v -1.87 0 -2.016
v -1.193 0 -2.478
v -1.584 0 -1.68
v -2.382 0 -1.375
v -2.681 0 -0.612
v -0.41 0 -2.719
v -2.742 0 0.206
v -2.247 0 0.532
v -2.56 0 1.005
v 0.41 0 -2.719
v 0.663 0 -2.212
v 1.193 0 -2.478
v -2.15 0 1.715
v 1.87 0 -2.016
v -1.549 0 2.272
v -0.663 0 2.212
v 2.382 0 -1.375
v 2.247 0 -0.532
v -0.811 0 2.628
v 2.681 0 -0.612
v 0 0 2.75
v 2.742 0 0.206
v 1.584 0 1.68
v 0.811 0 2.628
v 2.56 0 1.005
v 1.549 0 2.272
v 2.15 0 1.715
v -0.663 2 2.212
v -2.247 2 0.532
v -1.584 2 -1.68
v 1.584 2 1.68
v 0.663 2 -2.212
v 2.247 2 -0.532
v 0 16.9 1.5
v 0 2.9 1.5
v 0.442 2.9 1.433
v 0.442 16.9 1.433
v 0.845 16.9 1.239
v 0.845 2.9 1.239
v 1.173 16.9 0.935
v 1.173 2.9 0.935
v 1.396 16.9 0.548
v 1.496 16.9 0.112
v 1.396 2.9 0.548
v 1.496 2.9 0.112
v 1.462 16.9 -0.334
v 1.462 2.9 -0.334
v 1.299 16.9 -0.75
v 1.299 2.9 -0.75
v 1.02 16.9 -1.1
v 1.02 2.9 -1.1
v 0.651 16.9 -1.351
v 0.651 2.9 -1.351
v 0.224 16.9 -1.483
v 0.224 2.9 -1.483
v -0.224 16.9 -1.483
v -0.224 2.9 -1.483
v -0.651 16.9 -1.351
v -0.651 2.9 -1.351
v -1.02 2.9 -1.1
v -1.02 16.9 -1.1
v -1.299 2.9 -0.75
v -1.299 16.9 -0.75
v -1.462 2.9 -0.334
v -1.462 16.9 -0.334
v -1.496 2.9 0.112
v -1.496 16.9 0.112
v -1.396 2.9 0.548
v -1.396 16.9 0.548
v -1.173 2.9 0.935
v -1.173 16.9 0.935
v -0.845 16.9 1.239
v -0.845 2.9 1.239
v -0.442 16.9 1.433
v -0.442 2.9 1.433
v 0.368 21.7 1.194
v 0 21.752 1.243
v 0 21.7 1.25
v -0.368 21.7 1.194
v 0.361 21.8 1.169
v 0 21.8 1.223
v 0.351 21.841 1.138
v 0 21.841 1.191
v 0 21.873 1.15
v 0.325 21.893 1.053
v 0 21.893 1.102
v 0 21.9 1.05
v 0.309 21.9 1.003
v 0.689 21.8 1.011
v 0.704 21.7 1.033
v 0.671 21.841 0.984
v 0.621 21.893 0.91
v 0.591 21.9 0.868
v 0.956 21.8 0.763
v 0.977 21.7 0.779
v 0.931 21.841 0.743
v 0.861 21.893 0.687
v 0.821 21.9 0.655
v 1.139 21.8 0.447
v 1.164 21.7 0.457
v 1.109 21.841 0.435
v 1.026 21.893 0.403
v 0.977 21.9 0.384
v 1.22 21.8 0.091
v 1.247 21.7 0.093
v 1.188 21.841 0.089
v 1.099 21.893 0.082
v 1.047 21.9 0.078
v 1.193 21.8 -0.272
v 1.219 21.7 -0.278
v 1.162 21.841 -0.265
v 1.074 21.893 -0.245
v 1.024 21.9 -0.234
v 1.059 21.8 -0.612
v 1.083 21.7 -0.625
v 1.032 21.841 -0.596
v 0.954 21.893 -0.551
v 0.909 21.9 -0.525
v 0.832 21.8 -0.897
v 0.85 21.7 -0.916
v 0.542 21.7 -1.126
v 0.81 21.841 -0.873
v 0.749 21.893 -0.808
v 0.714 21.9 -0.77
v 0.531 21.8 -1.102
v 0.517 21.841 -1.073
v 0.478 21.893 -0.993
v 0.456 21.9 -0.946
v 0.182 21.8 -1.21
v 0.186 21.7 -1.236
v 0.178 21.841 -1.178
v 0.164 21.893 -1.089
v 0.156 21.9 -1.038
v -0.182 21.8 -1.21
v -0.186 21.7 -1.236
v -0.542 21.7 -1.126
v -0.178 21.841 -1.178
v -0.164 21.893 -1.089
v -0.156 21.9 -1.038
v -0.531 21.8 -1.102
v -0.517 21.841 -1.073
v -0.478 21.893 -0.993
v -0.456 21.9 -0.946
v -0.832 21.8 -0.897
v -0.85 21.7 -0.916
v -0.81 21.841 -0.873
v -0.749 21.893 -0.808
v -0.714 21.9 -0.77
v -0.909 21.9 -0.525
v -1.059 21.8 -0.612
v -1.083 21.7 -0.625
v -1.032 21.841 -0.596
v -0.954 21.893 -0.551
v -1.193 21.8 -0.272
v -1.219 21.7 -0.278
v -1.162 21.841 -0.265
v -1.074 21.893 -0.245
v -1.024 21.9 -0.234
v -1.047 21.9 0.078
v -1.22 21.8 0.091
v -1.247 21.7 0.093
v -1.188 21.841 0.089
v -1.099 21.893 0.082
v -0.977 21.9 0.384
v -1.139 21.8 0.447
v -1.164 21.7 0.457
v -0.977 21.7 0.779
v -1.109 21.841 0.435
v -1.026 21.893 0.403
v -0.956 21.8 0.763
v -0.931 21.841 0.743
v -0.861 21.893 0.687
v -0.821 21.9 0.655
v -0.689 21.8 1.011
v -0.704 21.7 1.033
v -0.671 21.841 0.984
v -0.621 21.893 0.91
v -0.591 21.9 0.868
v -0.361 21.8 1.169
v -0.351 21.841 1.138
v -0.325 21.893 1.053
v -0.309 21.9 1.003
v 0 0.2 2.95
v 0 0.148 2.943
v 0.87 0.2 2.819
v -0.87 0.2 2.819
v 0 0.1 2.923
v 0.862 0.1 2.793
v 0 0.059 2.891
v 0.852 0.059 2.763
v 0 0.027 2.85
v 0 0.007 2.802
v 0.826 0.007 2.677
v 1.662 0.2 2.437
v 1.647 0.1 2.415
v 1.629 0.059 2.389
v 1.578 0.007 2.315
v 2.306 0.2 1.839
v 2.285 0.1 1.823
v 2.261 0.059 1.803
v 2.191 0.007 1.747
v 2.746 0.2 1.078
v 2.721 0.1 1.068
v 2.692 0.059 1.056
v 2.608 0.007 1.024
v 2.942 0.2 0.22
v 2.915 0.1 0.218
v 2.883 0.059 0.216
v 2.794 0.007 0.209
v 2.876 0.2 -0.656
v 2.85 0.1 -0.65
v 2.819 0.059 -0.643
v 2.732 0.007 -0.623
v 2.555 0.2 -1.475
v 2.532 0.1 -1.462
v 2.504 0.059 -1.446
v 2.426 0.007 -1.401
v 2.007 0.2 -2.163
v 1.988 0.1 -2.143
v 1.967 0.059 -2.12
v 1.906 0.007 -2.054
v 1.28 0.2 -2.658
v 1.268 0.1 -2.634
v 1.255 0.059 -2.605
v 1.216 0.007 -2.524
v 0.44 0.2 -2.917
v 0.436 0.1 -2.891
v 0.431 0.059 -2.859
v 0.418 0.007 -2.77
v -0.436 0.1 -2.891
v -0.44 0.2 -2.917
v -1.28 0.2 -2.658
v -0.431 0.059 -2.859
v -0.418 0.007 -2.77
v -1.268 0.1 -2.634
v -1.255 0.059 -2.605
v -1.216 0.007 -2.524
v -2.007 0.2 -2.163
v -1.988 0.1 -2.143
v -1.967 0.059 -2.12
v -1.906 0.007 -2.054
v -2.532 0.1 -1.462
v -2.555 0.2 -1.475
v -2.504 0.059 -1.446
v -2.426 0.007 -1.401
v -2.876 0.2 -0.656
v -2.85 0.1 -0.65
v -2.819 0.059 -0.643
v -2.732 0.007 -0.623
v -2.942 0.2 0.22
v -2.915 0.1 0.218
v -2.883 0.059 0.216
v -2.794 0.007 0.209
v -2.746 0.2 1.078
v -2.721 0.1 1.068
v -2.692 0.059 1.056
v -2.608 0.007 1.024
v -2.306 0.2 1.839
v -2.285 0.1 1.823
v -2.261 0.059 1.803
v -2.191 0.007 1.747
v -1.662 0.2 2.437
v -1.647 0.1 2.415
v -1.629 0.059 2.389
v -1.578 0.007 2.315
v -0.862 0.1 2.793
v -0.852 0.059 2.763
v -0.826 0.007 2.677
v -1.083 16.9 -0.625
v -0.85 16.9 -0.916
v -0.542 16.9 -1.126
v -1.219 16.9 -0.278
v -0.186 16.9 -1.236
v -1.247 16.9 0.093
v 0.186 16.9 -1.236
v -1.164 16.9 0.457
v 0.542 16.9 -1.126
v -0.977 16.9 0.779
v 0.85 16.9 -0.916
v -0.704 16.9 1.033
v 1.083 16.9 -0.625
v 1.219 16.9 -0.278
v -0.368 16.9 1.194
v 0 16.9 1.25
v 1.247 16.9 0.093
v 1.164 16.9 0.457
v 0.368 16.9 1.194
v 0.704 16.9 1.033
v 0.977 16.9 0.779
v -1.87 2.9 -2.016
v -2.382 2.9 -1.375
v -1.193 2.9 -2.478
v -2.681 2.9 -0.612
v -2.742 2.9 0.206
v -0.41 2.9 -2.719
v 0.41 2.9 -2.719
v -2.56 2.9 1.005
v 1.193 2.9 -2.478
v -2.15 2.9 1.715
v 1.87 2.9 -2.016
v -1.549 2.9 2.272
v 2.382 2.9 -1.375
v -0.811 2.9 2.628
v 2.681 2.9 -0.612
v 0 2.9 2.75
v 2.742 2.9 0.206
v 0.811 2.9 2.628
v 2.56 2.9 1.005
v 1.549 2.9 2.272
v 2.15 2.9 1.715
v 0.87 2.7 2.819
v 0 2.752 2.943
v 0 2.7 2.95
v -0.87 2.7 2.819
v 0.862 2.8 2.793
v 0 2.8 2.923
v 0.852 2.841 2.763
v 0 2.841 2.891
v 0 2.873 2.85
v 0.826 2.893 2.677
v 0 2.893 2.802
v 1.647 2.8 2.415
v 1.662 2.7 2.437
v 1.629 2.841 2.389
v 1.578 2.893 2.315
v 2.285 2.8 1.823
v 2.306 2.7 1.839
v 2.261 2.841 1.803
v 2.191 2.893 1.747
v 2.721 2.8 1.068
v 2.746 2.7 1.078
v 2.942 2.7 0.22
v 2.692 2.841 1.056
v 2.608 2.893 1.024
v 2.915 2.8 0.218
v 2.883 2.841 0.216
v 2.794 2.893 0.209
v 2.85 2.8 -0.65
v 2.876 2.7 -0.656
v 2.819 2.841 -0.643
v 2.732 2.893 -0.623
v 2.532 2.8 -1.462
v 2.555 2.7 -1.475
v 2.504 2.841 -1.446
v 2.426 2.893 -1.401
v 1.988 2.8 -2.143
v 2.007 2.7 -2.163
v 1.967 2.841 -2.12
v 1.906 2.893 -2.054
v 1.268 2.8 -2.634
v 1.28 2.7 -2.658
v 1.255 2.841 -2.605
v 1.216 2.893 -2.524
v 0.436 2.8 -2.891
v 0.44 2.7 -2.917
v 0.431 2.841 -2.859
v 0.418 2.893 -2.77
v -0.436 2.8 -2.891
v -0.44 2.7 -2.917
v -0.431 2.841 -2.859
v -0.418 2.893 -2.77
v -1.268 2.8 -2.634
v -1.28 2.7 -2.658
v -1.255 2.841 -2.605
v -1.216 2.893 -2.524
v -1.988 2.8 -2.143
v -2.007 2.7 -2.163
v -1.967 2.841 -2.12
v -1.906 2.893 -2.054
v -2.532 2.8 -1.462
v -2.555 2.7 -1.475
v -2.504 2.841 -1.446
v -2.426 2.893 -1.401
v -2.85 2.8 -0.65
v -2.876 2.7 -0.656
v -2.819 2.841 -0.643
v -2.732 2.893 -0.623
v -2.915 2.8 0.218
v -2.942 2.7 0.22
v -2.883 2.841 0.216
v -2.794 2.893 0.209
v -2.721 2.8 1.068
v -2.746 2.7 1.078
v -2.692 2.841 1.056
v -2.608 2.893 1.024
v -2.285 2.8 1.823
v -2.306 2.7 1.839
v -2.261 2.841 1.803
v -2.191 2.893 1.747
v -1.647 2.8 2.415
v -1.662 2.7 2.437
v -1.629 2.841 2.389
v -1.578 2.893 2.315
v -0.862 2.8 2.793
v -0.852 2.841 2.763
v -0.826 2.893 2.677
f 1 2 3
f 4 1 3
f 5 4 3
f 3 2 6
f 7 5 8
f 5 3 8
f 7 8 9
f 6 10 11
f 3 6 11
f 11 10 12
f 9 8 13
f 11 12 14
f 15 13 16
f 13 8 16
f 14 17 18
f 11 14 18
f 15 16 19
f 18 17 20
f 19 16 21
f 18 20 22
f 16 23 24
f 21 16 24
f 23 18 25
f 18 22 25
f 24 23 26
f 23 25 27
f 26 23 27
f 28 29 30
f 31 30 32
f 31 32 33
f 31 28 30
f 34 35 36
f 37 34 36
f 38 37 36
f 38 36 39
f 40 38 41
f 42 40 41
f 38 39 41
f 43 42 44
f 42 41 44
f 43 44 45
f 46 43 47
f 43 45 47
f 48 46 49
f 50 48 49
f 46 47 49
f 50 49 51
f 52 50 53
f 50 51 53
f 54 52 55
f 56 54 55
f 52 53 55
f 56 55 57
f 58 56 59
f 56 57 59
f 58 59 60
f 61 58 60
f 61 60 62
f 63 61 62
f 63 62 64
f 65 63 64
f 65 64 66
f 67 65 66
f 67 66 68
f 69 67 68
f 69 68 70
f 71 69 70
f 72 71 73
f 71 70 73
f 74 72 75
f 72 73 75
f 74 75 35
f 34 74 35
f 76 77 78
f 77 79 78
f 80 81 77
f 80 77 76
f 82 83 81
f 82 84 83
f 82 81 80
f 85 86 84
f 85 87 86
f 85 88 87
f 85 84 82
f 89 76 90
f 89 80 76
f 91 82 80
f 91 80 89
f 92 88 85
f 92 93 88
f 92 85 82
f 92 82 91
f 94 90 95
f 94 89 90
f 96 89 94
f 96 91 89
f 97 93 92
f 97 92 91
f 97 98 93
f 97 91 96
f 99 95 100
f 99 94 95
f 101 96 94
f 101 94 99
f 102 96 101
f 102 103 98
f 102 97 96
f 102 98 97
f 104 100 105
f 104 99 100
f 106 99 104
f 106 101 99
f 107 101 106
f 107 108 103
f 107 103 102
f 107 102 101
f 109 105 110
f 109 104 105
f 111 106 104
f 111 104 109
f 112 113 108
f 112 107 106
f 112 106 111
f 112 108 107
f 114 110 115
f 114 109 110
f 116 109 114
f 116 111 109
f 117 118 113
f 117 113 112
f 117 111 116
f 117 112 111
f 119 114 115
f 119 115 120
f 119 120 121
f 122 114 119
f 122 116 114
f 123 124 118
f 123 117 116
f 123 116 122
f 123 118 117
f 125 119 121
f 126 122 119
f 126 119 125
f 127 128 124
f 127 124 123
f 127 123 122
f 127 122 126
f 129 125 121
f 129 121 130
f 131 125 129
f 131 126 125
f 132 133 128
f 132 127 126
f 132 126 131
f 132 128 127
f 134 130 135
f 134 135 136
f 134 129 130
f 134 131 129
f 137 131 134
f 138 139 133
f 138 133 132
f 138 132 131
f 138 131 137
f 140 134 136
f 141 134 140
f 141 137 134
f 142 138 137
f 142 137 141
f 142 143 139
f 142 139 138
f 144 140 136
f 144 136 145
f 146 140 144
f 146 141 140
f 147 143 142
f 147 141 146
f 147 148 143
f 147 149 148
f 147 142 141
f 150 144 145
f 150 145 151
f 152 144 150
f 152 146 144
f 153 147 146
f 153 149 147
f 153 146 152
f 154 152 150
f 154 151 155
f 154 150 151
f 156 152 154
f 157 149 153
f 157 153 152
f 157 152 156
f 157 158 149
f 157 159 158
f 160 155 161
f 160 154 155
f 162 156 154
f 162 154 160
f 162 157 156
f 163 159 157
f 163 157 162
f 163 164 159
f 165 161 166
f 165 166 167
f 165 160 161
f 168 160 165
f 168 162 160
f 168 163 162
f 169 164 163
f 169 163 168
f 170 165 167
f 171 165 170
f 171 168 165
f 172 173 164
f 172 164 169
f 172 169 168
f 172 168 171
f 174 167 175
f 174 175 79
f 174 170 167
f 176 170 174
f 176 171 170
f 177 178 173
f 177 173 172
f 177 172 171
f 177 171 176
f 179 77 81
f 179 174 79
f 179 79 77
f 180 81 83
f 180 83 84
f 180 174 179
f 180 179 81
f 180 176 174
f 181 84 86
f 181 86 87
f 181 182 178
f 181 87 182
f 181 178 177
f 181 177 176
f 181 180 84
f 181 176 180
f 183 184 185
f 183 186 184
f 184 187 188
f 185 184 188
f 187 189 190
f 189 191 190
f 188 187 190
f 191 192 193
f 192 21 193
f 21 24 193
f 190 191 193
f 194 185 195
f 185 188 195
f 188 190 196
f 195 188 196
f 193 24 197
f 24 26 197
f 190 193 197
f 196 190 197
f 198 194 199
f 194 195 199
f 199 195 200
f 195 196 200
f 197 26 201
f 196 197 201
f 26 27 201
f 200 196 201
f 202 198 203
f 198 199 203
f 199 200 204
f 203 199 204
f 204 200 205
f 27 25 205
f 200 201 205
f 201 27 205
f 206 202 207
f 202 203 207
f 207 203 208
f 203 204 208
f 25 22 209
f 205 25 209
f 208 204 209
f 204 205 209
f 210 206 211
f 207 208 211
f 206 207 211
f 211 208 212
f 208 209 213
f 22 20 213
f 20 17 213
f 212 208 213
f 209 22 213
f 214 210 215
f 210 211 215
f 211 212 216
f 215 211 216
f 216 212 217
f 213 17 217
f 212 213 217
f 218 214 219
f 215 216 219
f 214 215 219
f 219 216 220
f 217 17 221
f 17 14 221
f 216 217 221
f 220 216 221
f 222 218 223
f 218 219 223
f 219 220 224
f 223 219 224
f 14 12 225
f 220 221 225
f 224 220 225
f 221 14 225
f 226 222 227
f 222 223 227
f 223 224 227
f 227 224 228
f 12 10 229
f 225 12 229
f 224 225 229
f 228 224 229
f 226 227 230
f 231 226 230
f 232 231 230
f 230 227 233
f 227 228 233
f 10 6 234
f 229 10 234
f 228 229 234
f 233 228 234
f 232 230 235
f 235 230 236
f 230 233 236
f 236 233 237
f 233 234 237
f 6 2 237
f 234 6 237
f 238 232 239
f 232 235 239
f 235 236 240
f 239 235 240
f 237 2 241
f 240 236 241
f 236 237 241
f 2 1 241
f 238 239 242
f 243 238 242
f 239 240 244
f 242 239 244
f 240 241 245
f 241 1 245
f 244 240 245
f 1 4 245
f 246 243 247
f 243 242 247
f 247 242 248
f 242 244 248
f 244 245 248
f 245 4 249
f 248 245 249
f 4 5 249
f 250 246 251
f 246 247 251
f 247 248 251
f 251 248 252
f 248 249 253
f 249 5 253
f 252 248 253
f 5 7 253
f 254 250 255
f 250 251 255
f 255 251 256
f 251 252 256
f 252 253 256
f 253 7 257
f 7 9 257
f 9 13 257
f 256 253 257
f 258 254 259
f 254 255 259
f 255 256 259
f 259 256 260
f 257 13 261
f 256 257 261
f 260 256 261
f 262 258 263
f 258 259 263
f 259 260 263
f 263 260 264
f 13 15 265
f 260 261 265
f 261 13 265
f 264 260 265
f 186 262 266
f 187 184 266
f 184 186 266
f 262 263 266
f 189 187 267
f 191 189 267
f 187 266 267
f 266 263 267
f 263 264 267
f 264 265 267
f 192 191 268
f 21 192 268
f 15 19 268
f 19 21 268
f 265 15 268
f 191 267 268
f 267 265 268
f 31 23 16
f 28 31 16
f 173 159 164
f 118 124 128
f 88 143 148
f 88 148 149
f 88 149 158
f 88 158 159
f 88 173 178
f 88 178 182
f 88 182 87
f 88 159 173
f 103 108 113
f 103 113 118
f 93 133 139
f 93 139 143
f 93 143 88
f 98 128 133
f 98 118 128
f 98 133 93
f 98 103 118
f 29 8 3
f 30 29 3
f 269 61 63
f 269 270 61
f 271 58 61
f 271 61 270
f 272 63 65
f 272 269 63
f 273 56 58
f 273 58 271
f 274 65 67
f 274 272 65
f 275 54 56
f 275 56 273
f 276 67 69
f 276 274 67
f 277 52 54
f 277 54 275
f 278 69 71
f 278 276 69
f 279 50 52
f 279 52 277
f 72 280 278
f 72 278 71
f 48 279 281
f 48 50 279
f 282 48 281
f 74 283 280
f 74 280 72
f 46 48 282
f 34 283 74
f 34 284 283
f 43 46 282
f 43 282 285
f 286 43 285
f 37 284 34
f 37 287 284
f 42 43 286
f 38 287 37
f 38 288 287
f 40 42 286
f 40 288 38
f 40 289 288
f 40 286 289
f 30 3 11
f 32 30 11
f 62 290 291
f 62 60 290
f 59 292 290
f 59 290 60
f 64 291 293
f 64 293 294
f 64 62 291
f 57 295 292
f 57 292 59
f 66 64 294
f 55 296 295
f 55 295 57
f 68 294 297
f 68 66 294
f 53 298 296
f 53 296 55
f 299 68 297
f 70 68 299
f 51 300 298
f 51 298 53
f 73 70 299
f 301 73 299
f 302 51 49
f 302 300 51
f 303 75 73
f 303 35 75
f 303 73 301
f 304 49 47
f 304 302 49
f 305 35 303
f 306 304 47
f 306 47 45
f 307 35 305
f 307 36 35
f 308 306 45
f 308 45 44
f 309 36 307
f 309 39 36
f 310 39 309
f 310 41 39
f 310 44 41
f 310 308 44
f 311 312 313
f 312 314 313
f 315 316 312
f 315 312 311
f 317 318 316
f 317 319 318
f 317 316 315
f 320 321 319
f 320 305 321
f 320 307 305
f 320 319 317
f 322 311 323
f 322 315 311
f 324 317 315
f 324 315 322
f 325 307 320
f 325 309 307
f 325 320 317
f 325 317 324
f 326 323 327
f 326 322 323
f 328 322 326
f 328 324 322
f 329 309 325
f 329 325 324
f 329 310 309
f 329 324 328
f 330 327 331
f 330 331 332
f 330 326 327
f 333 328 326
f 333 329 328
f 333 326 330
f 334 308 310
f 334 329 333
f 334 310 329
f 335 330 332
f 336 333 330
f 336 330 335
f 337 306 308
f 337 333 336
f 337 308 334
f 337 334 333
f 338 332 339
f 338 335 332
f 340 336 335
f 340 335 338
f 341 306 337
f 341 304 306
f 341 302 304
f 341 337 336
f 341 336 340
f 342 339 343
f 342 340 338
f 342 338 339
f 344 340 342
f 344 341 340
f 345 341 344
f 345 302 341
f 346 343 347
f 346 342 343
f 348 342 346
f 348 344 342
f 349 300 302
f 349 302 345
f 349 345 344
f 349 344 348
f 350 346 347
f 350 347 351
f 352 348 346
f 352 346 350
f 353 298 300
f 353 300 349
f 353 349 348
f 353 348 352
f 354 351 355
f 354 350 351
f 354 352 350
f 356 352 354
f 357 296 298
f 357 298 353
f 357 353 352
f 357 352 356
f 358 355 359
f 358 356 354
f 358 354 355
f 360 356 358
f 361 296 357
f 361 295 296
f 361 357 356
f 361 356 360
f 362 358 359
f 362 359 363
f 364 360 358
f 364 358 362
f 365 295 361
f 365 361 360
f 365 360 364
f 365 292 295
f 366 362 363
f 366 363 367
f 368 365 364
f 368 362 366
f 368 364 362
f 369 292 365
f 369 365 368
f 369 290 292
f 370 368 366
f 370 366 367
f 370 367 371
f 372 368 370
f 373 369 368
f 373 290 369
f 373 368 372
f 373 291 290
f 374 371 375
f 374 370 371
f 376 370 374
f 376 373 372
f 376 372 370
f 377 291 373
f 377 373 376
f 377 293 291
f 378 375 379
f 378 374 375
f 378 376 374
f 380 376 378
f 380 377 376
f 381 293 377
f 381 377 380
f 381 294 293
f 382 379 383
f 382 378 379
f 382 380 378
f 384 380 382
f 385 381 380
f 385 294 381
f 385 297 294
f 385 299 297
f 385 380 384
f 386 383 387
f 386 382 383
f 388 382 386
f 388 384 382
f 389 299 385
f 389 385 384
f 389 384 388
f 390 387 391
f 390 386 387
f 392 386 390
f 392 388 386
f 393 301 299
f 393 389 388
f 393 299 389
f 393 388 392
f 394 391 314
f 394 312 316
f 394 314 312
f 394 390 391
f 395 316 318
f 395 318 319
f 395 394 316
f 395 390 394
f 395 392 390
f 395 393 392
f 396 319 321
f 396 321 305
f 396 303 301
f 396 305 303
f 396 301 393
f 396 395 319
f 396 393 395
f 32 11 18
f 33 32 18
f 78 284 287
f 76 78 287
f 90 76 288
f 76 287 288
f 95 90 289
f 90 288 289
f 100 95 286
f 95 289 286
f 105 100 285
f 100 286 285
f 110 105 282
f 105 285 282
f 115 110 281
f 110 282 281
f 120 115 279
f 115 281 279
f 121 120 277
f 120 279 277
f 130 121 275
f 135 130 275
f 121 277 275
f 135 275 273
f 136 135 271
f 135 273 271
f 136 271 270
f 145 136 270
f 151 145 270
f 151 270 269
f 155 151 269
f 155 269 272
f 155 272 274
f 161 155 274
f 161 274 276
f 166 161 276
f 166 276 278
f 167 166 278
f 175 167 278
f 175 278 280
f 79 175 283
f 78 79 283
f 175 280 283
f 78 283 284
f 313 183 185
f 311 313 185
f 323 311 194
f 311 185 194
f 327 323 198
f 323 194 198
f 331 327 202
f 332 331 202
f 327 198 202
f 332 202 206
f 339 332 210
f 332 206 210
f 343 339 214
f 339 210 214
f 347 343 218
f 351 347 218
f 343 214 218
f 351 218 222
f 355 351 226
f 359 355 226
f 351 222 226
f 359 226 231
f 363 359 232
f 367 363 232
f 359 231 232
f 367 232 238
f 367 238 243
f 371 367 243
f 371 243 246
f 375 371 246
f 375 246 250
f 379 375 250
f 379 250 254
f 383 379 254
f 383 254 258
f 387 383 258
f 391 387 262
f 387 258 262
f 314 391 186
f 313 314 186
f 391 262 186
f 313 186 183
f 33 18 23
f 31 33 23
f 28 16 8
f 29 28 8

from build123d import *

# Parameters (mm, degrees)
SKETCH_1_R          = 2.95
EXTRUDE_1_DEPTH     = 2.9
SKETCH_2_R          = 1.5
EXTRUDE_2_DEPTH     = 14
SKETCH_3_R          = 1.25
EXTRUDE_3_DEPTH     = 5
CUT_EXTRUDE_1_DEPTH = 2
FILLET_1_R          = 0.2


with BuildPart() as part:
    # 草图1 → 凸台-拉伸1 (new body)
    with BuildSketch(Plane(origin=(0, 0, 0), x_dir=(1, 0, 0), z_dir=(0, 1, 0))):
        with Locations(Location((0, 0, 0), (0, 0, 270))):
            Circle(SKETCH_1_R)
    extrude(amount=EXTRUDE_1_DEPTH)

    # 草图2 → 凸台-拉伸2 (add)
    with BuildSketch(Plane(origin=(0, 2.9, 0), x_dir=(1, 0, 0), z_dir=(0, 1, 0))):
        with Locations(Location((0, 0, 0), (0, 0, 270))):
            Circle(SKETCH_2_R)
    extrude(amount=EXTRUDE_2_DEPTH)

    # 草图3 → 凸台-拉伸3 (add)
    with BuildSketch(Plane(origin=(0, 16.9, 0), x_dir=(1, 0, 0), z_dir=(0, 1, 0))):
        with Locations(Location((0, 0, 0), (0, 0, 270))):
            Circle(SKETCH_3_R)
    extrude(amount=EXTRUDE_3_DEPTH)

    # 草图4 → 切除-拉伸1 (cut)
    with BuildSketch(Plane.XZ):
        Polygon((2.247285488, -0.53201623), (1.584382314, 1.680198207), (-0.662903174, 2.212214437), (-2.247285488, 0.53201623), (-1.584382314, -1.680198207), (0.662903174, -2.212214437), align=None)
    extrude(amount=-CUT_EXTRUDE_1_DEPTH, mode=Mode.SUBTRACT)

    # 圆角1
    fillet_1_edges = [part.edges().sort_by_distance(p)[0] for p in [
        (0, 21.9, -1.25),
        (0, 0, -2.95),
        (0, 2.9, -2.95),
    ]]
    fillet(fillet_1_edges, radius=FILLET_1_R)


solid = part.part
